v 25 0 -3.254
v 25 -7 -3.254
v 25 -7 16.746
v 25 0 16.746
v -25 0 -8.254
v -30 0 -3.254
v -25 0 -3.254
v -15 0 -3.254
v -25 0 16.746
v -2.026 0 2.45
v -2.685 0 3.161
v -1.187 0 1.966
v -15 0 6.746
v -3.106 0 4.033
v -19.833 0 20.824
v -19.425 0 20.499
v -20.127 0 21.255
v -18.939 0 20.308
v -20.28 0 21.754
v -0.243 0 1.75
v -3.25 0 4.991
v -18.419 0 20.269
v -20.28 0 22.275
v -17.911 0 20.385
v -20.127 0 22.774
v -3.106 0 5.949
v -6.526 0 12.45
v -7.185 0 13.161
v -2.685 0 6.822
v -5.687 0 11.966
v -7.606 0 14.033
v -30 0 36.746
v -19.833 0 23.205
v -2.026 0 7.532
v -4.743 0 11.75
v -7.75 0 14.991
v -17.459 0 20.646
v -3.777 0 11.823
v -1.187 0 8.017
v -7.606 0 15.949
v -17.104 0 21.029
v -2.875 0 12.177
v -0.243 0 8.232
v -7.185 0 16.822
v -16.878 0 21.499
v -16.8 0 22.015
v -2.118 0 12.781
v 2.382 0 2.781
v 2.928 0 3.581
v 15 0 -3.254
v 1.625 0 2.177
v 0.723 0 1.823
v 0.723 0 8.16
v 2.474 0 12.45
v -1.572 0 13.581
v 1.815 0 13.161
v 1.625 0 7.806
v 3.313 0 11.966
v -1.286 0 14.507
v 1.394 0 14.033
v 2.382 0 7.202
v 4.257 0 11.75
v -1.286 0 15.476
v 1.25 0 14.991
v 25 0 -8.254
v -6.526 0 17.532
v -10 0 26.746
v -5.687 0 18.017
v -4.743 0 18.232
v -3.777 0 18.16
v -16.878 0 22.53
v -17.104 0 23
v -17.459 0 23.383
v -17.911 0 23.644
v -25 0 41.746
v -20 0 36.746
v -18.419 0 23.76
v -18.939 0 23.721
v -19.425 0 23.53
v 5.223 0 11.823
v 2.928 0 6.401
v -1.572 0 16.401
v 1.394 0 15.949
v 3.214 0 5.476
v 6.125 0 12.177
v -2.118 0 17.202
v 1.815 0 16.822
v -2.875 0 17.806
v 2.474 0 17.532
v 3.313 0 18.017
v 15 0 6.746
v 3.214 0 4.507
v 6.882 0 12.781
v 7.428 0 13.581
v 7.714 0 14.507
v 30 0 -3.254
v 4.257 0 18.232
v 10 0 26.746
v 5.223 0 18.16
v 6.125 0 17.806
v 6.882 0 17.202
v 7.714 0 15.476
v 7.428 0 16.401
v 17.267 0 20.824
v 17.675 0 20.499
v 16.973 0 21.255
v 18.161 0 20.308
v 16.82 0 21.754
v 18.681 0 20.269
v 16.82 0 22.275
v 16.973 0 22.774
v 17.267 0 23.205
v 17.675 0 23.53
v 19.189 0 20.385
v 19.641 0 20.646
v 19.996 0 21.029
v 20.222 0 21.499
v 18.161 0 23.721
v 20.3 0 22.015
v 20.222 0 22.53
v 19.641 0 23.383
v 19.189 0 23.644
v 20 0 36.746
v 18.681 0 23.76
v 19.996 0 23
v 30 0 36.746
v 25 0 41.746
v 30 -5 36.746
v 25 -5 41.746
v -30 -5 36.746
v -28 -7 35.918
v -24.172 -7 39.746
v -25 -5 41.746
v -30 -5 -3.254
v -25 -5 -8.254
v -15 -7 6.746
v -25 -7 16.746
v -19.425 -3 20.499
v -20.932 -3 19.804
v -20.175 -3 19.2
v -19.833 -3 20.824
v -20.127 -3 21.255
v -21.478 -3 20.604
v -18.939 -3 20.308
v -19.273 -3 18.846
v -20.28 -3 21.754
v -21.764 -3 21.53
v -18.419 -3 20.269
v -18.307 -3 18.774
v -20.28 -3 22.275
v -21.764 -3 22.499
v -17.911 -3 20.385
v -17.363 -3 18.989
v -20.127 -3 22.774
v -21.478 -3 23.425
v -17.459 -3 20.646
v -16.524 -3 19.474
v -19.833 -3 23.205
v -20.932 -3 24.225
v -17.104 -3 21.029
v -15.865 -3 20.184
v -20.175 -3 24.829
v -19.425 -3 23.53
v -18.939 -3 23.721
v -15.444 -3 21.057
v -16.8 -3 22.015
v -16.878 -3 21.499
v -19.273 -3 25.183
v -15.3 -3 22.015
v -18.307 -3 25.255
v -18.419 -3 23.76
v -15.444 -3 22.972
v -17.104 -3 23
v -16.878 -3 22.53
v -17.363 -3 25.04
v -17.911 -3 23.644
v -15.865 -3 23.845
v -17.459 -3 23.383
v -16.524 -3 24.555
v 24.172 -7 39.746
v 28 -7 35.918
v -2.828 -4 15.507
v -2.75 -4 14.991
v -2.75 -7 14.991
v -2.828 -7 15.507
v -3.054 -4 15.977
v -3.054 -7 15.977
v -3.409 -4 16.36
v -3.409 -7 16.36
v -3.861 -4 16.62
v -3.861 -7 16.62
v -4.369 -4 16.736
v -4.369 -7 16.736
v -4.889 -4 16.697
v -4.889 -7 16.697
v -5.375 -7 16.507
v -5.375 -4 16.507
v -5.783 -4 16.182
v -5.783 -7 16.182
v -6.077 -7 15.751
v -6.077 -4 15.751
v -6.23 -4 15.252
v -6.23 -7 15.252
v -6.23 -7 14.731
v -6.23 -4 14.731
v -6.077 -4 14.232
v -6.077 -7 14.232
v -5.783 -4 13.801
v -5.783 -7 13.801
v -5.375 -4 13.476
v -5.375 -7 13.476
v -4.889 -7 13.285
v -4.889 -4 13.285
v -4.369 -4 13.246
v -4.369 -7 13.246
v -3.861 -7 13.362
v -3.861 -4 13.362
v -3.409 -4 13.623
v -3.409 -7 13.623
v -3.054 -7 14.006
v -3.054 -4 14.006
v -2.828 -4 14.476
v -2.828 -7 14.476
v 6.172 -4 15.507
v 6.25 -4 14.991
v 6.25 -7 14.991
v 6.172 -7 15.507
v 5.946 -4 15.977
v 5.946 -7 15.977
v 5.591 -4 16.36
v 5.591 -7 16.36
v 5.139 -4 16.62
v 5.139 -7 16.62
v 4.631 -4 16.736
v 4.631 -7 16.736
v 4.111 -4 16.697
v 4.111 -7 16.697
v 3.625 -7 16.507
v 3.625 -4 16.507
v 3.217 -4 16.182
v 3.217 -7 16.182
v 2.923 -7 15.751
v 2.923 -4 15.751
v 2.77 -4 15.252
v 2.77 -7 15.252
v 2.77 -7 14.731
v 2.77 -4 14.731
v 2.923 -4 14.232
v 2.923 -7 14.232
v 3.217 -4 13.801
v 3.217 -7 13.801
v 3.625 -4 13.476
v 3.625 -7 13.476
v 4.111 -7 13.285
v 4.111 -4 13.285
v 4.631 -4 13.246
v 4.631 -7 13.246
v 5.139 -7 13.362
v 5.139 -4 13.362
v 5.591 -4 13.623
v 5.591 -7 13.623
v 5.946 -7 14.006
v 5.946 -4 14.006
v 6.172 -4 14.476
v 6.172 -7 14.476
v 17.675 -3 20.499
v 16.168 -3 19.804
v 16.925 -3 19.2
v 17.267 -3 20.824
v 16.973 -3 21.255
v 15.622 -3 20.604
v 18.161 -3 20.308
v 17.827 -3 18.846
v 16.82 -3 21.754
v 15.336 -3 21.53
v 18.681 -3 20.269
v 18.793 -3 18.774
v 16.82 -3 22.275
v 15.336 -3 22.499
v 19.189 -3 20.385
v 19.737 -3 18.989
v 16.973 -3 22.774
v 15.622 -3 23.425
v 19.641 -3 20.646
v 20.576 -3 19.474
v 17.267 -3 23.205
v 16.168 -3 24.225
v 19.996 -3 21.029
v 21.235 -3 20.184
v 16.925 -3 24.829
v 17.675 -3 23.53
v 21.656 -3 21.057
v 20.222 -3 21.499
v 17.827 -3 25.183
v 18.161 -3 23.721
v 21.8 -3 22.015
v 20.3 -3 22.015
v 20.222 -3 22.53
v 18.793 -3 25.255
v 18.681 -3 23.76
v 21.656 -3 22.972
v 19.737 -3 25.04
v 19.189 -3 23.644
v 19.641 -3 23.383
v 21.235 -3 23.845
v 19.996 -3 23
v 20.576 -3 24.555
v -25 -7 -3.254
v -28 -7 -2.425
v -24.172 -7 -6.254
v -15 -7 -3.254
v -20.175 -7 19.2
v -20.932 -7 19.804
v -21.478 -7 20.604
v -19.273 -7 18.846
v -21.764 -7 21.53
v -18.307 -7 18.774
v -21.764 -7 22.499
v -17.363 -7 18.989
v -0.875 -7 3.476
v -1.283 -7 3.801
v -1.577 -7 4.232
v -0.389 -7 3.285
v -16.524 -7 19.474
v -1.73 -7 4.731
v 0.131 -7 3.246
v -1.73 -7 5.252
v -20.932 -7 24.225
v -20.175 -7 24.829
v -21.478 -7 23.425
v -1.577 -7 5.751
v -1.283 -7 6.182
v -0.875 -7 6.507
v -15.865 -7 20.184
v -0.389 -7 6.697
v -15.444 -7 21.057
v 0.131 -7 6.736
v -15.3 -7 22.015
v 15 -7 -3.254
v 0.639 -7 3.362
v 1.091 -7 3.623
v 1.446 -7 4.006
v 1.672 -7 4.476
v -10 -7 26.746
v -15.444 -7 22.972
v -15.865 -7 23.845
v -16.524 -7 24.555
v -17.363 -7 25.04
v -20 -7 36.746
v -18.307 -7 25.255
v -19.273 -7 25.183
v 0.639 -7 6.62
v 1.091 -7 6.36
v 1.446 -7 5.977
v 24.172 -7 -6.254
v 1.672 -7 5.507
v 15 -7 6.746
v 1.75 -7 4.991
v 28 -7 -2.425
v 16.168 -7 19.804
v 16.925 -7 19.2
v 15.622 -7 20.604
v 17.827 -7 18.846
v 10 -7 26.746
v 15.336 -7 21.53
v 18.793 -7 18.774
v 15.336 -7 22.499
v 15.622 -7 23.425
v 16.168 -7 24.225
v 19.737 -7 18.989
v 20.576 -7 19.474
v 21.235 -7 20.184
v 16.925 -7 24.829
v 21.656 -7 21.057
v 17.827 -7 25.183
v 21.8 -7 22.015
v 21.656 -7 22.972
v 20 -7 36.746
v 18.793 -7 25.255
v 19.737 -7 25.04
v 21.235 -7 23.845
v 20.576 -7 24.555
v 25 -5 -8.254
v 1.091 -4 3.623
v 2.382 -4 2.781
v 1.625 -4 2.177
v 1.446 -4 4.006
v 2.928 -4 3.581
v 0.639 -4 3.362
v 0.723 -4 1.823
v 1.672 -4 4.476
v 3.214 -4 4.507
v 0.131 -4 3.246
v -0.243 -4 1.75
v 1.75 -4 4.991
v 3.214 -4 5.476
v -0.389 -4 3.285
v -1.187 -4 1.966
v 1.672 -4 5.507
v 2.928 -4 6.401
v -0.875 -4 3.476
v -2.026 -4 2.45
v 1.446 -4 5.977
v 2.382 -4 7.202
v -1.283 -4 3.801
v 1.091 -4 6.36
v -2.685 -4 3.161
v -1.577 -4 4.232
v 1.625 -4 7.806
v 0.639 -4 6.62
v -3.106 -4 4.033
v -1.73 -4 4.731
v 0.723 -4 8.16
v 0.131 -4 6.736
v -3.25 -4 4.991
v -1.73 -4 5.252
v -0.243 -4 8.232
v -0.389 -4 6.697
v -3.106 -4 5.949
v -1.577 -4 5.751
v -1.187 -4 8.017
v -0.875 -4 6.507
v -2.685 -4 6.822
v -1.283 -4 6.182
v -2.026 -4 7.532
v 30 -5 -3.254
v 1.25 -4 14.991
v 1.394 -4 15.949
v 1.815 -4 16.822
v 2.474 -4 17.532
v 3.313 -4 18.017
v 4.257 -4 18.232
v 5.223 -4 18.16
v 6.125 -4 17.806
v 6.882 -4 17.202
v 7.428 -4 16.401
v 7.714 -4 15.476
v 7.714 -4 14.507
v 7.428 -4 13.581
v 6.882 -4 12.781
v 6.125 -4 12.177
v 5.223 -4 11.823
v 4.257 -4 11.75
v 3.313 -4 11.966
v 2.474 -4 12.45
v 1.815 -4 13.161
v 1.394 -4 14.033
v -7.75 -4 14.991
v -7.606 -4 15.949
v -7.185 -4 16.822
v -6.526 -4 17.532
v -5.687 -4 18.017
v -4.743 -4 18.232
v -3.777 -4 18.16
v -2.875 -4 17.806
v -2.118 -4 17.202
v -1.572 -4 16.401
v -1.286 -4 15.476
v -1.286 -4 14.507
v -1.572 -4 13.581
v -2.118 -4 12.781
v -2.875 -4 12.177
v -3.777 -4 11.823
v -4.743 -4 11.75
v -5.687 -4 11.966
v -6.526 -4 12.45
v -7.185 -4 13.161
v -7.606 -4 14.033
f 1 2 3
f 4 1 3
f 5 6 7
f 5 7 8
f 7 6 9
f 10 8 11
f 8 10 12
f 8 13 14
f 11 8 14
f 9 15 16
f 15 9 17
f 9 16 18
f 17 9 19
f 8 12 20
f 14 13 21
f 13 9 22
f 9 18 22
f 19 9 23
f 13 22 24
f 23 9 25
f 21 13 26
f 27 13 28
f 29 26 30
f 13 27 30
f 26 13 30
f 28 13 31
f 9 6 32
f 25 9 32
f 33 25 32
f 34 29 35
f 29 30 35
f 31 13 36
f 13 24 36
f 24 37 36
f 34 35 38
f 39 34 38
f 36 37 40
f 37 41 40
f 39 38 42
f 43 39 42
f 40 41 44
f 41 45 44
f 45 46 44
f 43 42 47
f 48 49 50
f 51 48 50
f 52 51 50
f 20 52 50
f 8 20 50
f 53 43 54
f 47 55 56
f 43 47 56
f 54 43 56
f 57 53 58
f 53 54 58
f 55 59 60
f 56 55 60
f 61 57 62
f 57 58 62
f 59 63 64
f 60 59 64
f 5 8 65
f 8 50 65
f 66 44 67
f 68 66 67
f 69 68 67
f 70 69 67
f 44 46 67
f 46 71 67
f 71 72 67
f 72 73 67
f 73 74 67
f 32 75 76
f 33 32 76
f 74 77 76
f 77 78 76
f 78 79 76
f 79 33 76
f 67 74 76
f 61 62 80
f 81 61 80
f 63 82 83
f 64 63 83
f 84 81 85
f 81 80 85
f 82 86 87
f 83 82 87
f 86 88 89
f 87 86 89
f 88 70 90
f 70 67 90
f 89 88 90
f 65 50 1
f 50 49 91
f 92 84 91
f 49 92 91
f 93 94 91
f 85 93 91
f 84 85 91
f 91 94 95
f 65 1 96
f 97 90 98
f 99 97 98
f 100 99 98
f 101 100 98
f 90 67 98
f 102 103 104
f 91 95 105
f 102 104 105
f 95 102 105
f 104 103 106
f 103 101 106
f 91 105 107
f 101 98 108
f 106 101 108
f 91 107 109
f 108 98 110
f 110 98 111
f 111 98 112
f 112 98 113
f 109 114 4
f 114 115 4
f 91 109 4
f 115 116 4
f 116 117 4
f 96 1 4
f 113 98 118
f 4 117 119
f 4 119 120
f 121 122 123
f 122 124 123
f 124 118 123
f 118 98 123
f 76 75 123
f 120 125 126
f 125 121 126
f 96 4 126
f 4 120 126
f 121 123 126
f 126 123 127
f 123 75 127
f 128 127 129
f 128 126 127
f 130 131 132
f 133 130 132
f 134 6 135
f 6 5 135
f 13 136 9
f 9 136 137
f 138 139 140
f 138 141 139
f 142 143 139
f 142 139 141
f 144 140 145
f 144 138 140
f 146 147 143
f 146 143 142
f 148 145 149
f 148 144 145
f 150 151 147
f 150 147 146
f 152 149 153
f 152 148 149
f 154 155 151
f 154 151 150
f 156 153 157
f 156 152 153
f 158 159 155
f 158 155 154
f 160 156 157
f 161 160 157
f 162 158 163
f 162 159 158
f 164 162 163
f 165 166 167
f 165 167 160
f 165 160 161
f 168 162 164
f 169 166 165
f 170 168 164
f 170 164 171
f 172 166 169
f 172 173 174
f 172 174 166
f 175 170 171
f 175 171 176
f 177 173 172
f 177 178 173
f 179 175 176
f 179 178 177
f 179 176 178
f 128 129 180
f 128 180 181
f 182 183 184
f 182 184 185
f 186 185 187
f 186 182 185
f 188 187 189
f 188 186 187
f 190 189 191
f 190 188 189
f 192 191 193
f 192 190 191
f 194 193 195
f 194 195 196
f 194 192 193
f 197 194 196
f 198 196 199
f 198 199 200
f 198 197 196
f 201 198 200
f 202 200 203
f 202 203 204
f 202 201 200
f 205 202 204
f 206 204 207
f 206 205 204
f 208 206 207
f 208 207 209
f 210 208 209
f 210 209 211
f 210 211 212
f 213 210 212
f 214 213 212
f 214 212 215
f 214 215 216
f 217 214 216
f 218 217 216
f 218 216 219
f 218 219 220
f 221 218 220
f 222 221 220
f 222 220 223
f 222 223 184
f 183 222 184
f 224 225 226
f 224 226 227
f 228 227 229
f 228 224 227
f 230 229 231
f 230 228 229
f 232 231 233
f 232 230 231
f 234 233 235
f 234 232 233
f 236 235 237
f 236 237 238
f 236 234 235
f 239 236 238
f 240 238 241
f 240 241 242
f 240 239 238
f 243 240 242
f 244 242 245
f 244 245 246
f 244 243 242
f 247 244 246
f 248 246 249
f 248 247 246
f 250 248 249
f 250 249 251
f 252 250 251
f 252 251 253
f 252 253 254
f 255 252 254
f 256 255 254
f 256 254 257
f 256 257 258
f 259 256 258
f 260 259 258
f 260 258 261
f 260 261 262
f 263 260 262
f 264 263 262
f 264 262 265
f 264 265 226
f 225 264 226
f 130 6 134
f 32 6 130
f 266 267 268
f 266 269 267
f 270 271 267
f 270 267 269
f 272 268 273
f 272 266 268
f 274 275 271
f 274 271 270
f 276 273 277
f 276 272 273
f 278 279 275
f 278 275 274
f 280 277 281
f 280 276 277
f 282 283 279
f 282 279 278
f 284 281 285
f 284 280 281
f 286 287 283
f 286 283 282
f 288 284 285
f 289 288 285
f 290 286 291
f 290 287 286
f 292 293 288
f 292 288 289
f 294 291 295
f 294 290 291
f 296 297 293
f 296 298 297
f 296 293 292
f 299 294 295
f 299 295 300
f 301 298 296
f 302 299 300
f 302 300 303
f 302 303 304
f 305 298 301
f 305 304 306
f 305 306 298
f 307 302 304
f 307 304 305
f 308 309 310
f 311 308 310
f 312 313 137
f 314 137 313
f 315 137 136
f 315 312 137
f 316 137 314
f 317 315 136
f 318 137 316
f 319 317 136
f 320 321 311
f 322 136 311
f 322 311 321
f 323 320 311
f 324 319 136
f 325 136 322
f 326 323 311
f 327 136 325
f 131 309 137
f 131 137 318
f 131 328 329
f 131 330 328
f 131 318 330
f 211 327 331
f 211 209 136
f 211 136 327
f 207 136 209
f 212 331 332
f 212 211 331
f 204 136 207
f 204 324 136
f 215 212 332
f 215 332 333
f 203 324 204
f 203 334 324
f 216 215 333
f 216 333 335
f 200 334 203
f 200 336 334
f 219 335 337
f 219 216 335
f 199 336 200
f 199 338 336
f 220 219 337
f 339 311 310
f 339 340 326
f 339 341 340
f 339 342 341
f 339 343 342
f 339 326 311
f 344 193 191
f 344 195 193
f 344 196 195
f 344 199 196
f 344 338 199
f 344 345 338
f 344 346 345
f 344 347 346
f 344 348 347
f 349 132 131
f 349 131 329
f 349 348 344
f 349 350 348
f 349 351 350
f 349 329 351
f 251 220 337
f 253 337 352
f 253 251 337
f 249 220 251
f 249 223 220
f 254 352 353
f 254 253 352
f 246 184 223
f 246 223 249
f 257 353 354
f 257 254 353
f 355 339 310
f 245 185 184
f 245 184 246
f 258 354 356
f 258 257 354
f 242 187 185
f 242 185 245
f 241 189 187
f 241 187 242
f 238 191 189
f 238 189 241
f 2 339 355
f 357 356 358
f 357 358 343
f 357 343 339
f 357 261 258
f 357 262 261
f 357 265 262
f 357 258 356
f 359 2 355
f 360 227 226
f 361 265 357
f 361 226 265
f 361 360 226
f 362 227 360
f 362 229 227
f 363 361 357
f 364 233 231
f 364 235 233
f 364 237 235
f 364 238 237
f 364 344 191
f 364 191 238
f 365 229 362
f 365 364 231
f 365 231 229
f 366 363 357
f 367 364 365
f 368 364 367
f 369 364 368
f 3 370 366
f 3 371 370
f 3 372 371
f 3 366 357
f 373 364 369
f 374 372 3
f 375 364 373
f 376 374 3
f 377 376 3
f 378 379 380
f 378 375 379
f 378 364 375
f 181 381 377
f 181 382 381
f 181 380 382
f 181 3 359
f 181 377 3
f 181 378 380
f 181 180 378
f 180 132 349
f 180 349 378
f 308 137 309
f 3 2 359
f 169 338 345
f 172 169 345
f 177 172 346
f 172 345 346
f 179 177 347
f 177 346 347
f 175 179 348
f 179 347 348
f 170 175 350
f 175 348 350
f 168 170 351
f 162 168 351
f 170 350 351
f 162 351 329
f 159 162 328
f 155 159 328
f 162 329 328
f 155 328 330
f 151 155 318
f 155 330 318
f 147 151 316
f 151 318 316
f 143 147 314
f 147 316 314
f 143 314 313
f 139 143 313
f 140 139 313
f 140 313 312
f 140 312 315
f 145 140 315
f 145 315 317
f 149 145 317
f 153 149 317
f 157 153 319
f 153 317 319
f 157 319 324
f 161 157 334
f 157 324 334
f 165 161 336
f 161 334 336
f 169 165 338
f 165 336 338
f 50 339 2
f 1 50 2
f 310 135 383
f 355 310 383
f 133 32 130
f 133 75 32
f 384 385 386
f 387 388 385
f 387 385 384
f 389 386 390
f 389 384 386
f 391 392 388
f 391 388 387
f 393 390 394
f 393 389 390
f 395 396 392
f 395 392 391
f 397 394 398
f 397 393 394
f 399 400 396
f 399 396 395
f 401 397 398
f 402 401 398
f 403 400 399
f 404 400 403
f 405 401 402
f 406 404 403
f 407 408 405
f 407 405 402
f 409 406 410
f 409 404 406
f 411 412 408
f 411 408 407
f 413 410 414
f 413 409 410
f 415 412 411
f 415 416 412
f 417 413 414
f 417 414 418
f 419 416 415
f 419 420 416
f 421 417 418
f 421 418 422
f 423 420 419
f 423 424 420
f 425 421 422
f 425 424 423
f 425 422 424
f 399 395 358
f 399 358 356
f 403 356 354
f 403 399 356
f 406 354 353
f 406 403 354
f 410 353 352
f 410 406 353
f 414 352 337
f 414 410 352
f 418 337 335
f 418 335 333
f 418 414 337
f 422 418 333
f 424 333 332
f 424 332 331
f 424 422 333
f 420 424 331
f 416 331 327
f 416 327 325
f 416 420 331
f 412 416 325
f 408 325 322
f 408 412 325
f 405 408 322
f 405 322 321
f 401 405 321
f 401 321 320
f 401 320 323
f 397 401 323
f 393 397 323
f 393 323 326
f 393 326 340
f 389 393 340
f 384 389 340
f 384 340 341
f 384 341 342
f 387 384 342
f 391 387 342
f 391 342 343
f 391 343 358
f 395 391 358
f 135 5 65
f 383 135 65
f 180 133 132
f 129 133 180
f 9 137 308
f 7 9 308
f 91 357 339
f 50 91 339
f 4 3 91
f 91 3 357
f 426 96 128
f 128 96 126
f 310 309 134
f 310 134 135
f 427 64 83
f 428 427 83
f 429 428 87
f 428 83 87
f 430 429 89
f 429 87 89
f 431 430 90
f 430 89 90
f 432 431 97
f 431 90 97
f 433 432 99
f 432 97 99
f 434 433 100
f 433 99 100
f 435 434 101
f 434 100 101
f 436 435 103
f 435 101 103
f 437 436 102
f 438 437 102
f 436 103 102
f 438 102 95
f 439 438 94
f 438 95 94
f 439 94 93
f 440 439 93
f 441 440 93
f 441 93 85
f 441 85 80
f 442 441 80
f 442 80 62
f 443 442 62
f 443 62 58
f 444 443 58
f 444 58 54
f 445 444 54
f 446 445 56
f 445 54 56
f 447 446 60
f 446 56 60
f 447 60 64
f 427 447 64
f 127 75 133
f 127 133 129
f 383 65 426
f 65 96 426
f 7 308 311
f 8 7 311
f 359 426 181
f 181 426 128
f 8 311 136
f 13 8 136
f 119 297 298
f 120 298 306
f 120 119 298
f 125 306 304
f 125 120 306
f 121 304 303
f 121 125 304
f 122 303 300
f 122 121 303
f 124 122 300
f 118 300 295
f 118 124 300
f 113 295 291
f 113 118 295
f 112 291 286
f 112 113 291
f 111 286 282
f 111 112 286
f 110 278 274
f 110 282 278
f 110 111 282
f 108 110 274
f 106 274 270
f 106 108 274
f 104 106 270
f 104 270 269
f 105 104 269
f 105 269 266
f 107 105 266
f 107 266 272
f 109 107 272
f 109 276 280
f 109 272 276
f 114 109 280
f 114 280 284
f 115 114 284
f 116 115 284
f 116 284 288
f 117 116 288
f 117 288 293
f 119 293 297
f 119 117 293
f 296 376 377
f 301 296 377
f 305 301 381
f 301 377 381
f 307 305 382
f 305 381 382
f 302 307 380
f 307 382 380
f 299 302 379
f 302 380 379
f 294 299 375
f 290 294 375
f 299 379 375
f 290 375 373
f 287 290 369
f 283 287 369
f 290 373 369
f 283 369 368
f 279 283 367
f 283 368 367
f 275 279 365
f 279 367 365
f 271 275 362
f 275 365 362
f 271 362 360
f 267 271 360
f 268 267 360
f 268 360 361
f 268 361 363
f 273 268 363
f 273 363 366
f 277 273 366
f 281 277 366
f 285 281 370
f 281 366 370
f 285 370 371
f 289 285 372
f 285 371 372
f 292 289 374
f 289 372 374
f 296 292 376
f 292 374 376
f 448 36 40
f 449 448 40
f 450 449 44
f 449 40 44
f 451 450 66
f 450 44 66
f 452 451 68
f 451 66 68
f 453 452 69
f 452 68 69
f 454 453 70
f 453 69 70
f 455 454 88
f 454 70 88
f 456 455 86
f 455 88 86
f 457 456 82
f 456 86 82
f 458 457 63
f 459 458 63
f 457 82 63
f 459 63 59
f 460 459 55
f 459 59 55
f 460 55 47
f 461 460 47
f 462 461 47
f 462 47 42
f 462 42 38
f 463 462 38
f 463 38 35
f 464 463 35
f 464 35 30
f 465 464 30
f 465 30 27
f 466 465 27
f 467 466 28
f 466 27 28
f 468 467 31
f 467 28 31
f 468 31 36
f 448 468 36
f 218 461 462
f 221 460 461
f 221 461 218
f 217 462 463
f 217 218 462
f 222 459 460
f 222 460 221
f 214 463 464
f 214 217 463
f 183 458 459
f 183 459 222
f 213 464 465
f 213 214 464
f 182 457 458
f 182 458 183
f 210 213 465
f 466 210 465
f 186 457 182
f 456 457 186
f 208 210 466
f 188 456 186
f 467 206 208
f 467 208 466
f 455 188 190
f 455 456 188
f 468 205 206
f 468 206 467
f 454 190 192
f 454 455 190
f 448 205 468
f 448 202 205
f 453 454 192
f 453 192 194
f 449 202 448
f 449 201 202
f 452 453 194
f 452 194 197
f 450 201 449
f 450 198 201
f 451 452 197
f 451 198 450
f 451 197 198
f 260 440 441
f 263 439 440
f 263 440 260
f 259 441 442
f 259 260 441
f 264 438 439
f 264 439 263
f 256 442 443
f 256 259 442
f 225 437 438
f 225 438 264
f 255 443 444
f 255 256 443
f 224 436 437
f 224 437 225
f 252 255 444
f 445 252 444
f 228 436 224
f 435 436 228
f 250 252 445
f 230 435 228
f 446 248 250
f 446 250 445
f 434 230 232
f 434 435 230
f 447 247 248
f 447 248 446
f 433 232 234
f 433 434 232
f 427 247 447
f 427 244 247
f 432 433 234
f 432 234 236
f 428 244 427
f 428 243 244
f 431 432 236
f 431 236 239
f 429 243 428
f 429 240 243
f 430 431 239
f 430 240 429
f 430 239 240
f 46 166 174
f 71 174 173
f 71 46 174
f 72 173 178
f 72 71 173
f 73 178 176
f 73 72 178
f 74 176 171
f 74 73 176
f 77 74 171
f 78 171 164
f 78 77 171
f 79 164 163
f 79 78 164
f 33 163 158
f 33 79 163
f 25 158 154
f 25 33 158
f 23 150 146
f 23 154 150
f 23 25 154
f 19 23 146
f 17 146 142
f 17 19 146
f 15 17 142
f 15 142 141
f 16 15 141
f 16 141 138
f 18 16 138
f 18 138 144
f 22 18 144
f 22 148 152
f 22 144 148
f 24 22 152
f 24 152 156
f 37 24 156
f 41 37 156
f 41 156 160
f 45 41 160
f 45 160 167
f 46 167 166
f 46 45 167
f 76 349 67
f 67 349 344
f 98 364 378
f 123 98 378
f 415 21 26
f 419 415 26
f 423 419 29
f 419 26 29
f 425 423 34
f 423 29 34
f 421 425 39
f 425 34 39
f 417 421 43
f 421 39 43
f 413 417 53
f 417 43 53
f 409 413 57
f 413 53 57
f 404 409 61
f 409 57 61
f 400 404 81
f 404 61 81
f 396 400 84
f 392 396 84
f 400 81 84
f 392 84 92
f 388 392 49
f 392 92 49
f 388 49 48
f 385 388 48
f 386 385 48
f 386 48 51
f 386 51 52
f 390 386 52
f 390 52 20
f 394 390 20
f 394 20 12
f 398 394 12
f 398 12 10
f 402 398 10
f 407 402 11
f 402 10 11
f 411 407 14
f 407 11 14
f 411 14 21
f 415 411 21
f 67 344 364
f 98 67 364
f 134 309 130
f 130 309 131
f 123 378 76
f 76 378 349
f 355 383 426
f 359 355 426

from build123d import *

# Parameters (mm, degrees)
F0_W     = 60
F0_H     = 50
F0_R     = 1.75
F1_DEPTH = 7
F2_SIZE  = 5
F3_R     = 3.25
F4_DEPTH = 4
F5_R     = 3.25
F6_DEPTH = 4
F8_DEPTH = 7.001
F9_SIZE  = 2


with BuildPart() as f1:
    # F0 (on Front) → F1 (new body)
    with BuildSketch(Plane.XZ):
        with Locations((0, 16.7464785278)):
            Rectangle(F0_W, F0_H)
        with Locations((-4.5, 14.9913392961)):
            Circle(F0_R, mode=Mode.SUBTRACT)
        with Locations((0, 4.9913392961)):
            Circle(F0_R, mode=Mode.SUBTRACT)
        with Locations((4.5, 14.9913392961)):
            Circle(F0_R, mode=Mode.SUBTRACT)
        with Locations((-18.55, 22.0145061612)):
            Circle(F0_R, mode=Mode.SUBTRACT)
        with Locations((18.55, 22.0145061612)):
            Circle(F0_R, mode=Mode.SUBTRACT)
    extrude(amount=F1_DEPTH)

    # F2
    f2_edges = [f1.edges().sort_by_distance(p)[0] for p in [
        (-30, -3.5, -8.253521),
        (30, -3.5, -8.253521),
        (30, -3.5, 41.746479),
        (-30, -3.5, 41.746479),
    ]]
    chamfer(f2_edges, length=F2_SIZE)

    # F3 (on face) → F4 (cut)
    with BuildSketch(Plane(origin=(0, 0, 0), x_dir=(-1, 0, 0), z_dir=(0, 1, 0))):
        with Locations((-4.5, 14.9913392961)):
            Circle(F3_R)
        with Locations((4.5, 14.9913392961)):
            Circle(F3_R)
        with Locations((0, 4.9913392961)):
            Circle(F3_R)
    extrude(amount=-F4_DEPTH, mode=Mode.SUBTRACT)

    # F5 (on face) → F6 (cut)
    with BuildSketch(Plane.XZ.offset(7)):
        with Locations((-18.55, 22.0145061612)):
            Circle(F5_R)
        with Locations((18.55, 22.0145061612)):
            Circle(F5_R)
    extrude(amount=-F6_DEPTH, mode=Mode.SUBTRACT)

    # F7 (on face) → F8 (cut, through all)
    with BuildSketch(Plane.XZ.offset(7)):
        Polygon((20, 36.7464785278), (0, 36.7464785278), (-20, 36.7464785278), (-10, 26.7464785278), (0, 26.7464785278), (10, 26.7464785278), align=None)
        Polygon((25, -3.2535214722), (25, 16.7464785278), (15, 6.7464785278), (15, -3.2535214722), align=None)
        Polygon((-15, 6.7464785278), (-25, 16.7464785278), (-25, -3.2535214722), (-15, -3.2535214722), align=None)
    extrude(amount=-F8_DEPTH, mode=Mode.SUBTRACT)

    # F9
    f9_edges = [f1.edges().sort_by_distance(p)[0] for p in [
        (0, -7, 41.746479),
        (27.5, -7, 39.246479),
        (-27.5, -7, 39.246479),
        (30, -7, 16.746479),
        (27.5, -7, -5.753521),
        (0, -7, -8.253521),
        (-27.5, -7, -5.753521),
        (-30, -7, 16.746479),
    ]]
    chamfer(f9_edges, length=F9_SIZE)


solid = f1.part
